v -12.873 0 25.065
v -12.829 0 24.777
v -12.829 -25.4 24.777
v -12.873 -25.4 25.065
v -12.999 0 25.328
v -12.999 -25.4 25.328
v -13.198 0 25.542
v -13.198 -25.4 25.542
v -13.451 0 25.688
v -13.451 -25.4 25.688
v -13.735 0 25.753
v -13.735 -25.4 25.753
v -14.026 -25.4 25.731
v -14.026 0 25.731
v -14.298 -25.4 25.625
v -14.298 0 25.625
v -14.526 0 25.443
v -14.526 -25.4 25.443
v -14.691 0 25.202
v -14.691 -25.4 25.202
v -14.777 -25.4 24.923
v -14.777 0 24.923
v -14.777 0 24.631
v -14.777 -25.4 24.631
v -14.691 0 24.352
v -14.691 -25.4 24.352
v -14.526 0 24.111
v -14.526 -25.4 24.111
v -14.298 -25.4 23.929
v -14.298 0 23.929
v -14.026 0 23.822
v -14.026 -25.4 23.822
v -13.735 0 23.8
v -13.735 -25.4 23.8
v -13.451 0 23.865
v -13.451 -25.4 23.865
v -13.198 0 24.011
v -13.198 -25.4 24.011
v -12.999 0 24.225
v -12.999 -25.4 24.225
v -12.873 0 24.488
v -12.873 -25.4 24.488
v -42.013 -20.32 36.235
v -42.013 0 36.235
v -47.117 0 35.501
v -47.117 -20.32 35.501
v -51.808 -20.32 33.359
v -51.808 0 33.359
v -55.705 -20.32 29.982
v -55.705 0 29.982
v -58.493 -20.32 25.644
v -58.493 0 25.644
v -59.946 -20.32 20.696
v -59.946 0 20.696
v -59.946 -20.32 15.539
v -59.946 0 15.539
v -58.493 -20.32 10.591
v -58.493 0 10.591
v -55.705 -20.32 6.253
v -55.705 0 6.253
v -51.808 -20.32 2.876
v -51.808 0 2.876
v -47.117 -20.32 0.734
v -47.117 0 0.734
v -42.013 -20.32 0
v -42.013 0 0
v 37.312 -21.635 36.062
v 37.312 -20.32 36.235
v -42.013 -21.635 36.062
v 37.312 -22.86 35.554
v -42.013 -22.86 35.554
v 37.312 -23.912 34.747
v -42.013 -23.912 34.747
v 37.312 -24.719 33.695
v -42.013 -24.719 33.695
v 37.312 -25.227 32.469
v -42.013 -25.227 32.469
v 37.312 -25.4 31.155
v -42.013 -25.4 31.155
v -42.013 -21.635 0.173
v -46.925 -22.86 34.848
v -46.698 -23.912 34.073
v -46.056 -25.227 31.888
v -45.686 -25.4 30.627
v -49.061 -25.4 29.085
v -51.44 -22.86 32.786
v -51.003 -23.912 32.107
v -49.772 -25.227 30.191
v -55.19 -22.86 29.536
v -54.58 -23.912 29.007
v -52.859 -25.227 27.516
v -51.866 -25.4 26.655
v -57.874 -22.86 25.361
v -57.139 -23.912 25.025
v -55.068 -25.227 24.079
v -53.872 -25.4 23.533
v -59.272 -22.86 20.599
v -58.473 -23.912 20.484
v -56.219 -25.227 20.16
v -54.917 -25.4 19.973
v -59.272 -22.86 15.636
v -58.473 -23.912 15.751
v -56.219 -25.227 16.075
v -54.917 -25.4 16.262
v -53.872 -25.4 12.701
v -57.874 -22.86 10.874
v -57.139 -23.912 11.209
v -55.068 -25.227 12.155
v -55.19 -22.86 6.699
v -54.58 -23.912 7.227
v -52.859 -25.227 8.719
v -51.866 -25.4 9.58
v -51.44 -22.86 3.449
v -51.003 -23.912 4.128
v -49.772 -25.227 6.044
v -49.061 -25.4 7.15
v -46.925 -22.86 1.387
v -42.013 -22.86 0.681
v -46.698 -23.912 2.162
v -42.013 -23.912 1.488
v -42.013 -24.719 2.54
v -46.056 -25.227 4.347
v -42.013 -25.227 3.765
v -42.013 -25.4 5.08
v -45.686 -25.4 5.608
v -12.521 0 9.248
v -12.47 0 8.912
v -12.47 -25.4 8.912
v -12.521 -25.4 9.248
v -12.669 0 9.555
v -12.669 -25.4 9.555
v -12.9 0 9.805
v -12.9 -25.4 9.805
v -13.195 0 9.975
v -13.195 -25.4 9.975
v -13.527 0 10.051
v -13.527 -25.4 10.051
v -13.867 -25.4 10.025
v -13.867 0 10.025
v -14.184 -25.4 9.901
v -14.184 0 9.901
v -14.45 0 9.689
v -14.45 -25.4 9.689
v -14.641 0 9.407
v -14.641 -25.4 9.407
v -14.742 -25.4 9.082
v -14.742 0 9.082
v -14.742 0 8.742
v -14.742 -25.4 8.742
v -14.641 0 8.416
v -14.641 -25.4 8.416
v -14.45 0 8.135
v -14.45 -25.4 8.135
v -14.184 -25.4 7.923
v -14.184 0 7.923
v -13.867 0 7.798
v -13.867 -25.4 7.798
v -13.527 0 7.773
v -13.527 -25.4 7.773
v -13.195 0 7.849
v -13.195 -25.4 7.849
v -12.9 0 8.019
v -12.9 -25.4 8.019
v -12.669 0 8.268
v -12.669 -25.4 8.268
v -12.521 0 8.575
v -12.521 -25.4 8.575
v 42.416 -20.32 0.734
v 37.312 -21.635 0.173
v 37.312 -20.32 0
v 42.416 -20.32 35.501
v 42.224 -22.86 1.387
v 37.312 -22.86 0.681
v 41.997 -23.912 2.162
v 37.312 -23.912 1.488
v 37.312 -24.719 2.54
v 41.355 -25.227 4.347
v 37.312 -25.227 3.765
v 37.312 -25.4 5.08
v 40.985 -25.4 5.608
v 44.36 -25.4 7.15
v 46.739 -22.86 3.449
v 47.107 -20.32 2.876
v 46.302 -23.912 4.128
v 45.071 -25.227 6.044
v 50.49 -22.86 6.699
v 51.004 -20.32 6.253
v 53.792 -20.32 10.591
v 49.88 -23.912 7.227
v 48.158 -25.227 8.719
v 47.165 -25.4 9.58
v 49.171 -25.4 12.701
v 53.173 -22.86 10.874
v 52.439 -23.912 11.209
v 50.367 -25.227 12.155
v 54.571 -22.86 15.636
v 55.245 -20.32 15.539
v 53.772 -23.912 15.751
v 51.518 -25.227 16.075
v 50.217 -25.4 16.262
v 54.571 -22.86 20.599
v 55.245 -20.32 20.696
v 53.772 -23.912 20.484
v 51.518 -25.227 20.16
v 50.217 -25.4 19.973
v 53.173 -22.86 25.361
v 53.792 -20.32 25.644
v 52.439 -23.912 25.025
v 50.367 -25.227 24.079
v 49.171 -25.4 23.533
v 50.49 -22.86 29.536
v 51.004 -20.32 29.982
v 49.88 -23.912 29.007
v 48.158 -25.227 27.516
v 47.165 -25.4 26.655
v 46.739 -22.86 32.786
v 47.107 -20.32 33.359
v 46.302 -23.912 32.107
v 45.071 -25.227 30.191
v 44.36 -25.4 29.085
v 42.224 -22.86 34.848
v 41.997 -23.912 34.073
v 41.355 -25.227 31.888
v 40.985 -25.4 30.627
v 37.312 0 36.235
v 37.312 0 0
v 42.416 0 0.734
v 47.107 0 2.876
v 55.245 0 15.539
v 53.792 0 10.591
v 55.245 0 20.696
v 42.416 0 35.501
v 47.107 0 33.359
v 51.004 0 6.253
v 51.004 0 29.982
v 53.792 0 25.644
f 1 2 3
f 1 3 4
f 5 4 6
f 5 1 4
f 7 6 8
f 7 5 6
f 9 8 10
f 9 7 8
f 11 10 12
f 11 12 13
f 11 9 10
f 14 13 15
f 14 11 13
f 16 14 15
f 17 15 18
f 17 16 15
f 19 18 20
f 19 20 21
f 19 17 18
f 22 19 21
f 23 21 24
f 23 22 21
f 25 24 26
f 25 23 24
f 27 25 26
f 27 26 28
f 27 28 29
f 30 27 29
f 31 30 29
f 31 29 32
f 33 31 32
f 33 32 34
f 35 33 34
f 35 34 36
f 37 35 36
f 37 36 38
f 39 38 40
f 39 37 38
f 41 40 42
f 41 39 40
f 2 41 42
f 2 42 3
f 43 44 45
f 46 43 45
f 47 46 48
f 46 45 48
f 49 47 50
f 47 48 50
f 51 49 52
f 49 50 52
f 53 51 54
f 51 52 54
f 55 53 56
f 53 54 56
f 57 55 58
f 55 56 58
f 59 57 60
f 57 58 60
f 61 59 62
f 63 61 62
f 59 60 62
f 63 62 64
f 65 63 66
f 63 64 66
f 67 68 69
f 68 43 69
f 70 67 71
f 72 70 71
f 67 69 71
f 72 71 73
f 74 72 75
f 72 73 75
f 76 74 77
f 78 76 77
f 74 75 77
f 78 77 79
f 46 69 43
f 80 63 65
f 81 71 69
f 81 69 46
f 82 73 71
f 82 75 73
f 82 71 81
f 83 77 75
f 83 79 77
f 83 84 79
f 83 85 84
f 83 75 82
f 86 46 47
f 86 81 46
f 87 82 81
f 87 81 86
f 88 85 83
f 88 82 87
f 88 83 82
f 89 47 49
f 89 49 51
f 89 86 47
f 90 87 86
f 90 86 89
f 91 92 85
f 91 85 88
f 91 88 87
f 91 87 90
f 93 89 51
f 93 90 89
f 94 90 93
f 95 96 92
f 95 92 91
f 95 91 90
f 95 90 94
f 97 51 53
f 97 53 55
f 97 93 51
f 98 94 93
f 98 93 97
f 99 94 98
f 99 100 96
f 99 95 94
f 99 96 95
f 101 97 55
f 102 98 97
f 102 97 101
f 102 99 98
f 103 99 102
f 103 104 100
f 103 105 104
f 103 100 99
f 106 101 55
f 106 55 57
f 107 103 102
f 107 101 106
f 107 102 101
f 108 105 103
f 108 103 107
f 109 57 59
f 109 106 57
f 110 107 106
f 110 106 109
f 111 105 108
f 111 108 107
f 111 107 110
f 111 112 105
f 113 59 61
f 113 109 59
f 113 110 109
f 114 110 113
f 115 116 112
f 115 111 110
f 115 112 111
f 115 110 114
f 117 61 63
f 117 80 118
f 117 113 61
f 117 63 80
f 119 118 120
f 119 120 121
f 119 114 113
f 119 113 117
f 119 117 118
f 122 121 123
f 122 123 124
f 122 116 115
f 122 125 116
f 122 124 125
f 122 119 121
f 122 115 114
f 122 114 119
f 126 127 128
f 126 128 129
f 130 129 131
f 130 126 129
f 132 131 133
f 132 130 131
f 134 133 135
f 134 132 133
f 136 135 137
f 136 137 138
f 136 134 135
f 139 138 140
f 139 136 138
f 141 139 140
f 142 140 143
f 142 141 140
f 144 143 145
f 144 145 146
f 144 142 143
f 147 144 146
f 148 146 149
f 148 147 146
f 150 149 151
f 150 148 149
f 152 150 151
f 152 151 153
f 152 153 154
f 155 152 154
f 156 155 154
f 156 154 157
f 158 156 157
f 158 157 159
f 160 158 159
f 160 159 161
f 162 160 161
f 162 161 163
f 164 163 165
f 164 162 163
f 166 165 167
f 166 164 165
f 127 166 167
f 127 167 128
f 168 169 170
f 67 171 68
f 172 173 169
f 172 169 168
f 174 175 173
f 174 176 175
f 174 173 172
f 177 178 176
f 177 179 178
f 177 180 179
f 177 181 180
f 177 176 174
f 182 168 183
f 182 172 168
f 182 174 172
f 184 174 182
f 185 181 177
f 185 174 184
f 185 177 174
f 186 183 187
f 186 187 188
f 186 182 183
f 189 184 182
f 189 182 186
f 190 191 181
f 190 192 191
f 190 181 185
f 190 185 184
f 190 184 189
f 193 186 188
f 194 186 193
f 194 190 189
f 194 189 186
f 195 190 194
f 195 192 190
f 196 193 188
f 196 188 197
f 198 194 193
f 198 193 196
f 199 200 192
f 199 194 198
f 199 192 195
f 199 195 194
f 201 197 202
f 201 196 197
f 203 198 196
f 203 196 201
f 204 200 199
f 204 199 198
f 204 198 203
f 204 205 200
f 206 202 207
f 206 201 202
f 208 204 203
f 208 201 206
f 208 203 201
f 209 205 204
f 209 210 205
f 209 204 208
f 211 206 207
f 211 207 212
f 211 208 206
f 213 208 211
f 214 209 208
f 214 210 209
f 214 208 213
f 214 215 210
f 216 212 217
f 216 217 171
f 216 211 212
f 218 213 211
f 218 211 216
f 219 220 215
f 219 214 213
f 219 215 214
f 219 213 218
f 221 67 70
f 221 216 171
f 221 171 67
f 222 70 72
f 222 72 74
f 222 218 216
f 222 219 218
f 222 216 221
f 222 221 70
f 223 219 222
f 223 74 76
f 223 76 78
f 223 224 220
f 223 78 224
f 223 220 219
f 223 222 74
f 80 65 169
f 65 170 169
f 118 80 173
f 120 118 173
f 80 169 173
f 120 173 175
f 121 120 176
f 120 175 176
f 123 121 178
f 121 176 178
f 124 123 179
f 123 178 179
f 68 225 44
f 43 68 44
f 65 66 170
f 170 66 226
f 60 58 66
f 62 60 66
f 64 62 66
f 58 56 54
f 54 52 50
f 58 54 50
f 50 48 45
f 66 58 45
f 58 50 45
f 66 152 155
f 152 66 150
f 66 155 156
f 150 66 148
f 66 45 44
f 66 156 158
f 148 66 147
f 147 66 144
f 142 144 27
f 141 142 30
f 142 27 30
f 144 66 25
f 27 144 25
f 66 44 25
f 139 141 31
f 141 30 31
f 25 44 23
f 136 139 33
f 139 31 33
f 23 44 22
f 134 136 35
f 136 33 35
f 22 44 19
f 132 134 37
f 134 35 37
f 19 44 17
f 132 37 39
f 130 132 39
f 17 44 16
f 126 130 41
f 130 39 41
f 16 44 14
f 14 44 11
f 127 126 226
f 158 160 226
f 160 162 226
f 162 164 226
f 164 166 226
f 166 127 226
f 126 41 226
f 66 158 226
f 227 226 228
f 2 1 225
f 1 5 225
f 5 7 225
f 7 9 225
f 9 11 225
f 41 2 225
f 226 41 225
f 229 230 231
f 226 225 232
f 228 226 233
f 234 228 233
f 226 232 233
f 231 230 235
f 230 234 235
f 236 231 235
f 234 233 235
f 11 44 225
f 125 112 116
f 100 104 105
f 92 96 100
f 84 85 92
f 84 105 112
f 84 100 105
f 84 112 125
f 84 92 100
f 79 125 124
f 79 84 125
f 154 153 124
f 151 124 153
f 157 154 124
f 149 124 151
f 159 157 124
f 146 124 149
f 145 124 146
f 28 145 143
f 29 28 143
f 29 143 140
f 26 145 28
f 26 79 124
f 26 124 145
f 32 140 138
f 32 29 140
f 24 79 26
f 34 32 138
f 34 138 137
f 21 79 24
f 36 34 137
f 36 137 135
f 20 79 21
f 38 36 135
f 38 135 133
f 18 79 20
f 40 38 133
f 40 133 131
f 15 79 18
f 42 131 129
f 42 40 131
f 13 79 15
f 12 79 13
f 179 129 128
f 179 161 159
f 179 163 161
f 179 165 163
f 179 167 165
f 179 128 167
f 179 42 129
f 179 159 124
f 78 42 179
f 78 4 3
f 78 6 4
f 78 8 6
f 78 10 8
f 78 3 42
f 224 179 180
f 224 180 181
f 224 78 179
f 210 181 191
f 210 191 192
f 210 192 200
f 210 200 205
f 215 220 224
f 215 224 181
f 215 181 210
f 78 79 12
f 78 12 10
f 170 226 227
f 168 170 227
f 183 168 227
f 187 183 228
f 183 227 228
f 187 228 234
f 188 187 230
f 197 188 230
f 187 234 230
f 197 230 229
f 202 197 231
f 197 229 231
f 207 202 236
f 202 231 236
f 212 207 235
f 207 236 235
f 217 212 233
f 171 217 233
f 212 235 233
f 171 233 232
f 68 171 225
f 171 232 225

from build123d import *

# Parameters (mm, degrees)
F0_R     = 1.142067
F0_R_2   = 12.345582
F0_R_3   = 0.979315
F0_R_4   = 12.168057
F1_DEPTH = 25.4
F2_R     = 5.08


with BuildPart() as f1:
    # F0 (on Front) → F1 (new body)
    with BuildSketch(Plane.XZ):
        with BuildLine():
            Line((37.311886, 36.23464), (-42.012595, 36.23464))
            ThreePointArc((-42.012595, 36.23464), (-60.129914, 18.11732), (-42.012595, 0))
            Line((-42.012595, 0), (37.311886, 0))
            ThreePointArc((37.311886, 0), (55.429205, 18.11732), (37.311886, 36.23464))
        make_face()
        with Locations((-13.612472, 8.911762)):
            Circle(F0_R, mode=Mode.SUBTRACT)
        with Locations((8.128311, 17.333869)):
            Circle(F0_R_2, mode=Mode.SUBTRACT)
        with Locations((-13.808336, 24.776658)):
            Circle(F0_R_3, mode=Mode.SUBTRACT)
        with Locations((37.311886, 18.11732)):
            Circle(F0_R_4, mode=Mode.SUBTRACT)
        with Locations((8.128311, 17.333869)):
            Circle(F0_R_2)
        with Locations((37.311886, 18.11732)):
            Circle(F0_R_4)
    extrude(amount=F1_DEPTH)

    # F2
    f2_edges = [f1.edges().sort_by_distance(p)[0] for p in [
        (-60.129914, -25.4, 18.11732),
        (-2.350355, -25.4, 36.23464),
        (-2.350355, -25.4, 0),
        (55.429205, -25.4, 18.11732),
    ]]
    fillet(f2_edges, radius=F2_R)


solid = f1.part
